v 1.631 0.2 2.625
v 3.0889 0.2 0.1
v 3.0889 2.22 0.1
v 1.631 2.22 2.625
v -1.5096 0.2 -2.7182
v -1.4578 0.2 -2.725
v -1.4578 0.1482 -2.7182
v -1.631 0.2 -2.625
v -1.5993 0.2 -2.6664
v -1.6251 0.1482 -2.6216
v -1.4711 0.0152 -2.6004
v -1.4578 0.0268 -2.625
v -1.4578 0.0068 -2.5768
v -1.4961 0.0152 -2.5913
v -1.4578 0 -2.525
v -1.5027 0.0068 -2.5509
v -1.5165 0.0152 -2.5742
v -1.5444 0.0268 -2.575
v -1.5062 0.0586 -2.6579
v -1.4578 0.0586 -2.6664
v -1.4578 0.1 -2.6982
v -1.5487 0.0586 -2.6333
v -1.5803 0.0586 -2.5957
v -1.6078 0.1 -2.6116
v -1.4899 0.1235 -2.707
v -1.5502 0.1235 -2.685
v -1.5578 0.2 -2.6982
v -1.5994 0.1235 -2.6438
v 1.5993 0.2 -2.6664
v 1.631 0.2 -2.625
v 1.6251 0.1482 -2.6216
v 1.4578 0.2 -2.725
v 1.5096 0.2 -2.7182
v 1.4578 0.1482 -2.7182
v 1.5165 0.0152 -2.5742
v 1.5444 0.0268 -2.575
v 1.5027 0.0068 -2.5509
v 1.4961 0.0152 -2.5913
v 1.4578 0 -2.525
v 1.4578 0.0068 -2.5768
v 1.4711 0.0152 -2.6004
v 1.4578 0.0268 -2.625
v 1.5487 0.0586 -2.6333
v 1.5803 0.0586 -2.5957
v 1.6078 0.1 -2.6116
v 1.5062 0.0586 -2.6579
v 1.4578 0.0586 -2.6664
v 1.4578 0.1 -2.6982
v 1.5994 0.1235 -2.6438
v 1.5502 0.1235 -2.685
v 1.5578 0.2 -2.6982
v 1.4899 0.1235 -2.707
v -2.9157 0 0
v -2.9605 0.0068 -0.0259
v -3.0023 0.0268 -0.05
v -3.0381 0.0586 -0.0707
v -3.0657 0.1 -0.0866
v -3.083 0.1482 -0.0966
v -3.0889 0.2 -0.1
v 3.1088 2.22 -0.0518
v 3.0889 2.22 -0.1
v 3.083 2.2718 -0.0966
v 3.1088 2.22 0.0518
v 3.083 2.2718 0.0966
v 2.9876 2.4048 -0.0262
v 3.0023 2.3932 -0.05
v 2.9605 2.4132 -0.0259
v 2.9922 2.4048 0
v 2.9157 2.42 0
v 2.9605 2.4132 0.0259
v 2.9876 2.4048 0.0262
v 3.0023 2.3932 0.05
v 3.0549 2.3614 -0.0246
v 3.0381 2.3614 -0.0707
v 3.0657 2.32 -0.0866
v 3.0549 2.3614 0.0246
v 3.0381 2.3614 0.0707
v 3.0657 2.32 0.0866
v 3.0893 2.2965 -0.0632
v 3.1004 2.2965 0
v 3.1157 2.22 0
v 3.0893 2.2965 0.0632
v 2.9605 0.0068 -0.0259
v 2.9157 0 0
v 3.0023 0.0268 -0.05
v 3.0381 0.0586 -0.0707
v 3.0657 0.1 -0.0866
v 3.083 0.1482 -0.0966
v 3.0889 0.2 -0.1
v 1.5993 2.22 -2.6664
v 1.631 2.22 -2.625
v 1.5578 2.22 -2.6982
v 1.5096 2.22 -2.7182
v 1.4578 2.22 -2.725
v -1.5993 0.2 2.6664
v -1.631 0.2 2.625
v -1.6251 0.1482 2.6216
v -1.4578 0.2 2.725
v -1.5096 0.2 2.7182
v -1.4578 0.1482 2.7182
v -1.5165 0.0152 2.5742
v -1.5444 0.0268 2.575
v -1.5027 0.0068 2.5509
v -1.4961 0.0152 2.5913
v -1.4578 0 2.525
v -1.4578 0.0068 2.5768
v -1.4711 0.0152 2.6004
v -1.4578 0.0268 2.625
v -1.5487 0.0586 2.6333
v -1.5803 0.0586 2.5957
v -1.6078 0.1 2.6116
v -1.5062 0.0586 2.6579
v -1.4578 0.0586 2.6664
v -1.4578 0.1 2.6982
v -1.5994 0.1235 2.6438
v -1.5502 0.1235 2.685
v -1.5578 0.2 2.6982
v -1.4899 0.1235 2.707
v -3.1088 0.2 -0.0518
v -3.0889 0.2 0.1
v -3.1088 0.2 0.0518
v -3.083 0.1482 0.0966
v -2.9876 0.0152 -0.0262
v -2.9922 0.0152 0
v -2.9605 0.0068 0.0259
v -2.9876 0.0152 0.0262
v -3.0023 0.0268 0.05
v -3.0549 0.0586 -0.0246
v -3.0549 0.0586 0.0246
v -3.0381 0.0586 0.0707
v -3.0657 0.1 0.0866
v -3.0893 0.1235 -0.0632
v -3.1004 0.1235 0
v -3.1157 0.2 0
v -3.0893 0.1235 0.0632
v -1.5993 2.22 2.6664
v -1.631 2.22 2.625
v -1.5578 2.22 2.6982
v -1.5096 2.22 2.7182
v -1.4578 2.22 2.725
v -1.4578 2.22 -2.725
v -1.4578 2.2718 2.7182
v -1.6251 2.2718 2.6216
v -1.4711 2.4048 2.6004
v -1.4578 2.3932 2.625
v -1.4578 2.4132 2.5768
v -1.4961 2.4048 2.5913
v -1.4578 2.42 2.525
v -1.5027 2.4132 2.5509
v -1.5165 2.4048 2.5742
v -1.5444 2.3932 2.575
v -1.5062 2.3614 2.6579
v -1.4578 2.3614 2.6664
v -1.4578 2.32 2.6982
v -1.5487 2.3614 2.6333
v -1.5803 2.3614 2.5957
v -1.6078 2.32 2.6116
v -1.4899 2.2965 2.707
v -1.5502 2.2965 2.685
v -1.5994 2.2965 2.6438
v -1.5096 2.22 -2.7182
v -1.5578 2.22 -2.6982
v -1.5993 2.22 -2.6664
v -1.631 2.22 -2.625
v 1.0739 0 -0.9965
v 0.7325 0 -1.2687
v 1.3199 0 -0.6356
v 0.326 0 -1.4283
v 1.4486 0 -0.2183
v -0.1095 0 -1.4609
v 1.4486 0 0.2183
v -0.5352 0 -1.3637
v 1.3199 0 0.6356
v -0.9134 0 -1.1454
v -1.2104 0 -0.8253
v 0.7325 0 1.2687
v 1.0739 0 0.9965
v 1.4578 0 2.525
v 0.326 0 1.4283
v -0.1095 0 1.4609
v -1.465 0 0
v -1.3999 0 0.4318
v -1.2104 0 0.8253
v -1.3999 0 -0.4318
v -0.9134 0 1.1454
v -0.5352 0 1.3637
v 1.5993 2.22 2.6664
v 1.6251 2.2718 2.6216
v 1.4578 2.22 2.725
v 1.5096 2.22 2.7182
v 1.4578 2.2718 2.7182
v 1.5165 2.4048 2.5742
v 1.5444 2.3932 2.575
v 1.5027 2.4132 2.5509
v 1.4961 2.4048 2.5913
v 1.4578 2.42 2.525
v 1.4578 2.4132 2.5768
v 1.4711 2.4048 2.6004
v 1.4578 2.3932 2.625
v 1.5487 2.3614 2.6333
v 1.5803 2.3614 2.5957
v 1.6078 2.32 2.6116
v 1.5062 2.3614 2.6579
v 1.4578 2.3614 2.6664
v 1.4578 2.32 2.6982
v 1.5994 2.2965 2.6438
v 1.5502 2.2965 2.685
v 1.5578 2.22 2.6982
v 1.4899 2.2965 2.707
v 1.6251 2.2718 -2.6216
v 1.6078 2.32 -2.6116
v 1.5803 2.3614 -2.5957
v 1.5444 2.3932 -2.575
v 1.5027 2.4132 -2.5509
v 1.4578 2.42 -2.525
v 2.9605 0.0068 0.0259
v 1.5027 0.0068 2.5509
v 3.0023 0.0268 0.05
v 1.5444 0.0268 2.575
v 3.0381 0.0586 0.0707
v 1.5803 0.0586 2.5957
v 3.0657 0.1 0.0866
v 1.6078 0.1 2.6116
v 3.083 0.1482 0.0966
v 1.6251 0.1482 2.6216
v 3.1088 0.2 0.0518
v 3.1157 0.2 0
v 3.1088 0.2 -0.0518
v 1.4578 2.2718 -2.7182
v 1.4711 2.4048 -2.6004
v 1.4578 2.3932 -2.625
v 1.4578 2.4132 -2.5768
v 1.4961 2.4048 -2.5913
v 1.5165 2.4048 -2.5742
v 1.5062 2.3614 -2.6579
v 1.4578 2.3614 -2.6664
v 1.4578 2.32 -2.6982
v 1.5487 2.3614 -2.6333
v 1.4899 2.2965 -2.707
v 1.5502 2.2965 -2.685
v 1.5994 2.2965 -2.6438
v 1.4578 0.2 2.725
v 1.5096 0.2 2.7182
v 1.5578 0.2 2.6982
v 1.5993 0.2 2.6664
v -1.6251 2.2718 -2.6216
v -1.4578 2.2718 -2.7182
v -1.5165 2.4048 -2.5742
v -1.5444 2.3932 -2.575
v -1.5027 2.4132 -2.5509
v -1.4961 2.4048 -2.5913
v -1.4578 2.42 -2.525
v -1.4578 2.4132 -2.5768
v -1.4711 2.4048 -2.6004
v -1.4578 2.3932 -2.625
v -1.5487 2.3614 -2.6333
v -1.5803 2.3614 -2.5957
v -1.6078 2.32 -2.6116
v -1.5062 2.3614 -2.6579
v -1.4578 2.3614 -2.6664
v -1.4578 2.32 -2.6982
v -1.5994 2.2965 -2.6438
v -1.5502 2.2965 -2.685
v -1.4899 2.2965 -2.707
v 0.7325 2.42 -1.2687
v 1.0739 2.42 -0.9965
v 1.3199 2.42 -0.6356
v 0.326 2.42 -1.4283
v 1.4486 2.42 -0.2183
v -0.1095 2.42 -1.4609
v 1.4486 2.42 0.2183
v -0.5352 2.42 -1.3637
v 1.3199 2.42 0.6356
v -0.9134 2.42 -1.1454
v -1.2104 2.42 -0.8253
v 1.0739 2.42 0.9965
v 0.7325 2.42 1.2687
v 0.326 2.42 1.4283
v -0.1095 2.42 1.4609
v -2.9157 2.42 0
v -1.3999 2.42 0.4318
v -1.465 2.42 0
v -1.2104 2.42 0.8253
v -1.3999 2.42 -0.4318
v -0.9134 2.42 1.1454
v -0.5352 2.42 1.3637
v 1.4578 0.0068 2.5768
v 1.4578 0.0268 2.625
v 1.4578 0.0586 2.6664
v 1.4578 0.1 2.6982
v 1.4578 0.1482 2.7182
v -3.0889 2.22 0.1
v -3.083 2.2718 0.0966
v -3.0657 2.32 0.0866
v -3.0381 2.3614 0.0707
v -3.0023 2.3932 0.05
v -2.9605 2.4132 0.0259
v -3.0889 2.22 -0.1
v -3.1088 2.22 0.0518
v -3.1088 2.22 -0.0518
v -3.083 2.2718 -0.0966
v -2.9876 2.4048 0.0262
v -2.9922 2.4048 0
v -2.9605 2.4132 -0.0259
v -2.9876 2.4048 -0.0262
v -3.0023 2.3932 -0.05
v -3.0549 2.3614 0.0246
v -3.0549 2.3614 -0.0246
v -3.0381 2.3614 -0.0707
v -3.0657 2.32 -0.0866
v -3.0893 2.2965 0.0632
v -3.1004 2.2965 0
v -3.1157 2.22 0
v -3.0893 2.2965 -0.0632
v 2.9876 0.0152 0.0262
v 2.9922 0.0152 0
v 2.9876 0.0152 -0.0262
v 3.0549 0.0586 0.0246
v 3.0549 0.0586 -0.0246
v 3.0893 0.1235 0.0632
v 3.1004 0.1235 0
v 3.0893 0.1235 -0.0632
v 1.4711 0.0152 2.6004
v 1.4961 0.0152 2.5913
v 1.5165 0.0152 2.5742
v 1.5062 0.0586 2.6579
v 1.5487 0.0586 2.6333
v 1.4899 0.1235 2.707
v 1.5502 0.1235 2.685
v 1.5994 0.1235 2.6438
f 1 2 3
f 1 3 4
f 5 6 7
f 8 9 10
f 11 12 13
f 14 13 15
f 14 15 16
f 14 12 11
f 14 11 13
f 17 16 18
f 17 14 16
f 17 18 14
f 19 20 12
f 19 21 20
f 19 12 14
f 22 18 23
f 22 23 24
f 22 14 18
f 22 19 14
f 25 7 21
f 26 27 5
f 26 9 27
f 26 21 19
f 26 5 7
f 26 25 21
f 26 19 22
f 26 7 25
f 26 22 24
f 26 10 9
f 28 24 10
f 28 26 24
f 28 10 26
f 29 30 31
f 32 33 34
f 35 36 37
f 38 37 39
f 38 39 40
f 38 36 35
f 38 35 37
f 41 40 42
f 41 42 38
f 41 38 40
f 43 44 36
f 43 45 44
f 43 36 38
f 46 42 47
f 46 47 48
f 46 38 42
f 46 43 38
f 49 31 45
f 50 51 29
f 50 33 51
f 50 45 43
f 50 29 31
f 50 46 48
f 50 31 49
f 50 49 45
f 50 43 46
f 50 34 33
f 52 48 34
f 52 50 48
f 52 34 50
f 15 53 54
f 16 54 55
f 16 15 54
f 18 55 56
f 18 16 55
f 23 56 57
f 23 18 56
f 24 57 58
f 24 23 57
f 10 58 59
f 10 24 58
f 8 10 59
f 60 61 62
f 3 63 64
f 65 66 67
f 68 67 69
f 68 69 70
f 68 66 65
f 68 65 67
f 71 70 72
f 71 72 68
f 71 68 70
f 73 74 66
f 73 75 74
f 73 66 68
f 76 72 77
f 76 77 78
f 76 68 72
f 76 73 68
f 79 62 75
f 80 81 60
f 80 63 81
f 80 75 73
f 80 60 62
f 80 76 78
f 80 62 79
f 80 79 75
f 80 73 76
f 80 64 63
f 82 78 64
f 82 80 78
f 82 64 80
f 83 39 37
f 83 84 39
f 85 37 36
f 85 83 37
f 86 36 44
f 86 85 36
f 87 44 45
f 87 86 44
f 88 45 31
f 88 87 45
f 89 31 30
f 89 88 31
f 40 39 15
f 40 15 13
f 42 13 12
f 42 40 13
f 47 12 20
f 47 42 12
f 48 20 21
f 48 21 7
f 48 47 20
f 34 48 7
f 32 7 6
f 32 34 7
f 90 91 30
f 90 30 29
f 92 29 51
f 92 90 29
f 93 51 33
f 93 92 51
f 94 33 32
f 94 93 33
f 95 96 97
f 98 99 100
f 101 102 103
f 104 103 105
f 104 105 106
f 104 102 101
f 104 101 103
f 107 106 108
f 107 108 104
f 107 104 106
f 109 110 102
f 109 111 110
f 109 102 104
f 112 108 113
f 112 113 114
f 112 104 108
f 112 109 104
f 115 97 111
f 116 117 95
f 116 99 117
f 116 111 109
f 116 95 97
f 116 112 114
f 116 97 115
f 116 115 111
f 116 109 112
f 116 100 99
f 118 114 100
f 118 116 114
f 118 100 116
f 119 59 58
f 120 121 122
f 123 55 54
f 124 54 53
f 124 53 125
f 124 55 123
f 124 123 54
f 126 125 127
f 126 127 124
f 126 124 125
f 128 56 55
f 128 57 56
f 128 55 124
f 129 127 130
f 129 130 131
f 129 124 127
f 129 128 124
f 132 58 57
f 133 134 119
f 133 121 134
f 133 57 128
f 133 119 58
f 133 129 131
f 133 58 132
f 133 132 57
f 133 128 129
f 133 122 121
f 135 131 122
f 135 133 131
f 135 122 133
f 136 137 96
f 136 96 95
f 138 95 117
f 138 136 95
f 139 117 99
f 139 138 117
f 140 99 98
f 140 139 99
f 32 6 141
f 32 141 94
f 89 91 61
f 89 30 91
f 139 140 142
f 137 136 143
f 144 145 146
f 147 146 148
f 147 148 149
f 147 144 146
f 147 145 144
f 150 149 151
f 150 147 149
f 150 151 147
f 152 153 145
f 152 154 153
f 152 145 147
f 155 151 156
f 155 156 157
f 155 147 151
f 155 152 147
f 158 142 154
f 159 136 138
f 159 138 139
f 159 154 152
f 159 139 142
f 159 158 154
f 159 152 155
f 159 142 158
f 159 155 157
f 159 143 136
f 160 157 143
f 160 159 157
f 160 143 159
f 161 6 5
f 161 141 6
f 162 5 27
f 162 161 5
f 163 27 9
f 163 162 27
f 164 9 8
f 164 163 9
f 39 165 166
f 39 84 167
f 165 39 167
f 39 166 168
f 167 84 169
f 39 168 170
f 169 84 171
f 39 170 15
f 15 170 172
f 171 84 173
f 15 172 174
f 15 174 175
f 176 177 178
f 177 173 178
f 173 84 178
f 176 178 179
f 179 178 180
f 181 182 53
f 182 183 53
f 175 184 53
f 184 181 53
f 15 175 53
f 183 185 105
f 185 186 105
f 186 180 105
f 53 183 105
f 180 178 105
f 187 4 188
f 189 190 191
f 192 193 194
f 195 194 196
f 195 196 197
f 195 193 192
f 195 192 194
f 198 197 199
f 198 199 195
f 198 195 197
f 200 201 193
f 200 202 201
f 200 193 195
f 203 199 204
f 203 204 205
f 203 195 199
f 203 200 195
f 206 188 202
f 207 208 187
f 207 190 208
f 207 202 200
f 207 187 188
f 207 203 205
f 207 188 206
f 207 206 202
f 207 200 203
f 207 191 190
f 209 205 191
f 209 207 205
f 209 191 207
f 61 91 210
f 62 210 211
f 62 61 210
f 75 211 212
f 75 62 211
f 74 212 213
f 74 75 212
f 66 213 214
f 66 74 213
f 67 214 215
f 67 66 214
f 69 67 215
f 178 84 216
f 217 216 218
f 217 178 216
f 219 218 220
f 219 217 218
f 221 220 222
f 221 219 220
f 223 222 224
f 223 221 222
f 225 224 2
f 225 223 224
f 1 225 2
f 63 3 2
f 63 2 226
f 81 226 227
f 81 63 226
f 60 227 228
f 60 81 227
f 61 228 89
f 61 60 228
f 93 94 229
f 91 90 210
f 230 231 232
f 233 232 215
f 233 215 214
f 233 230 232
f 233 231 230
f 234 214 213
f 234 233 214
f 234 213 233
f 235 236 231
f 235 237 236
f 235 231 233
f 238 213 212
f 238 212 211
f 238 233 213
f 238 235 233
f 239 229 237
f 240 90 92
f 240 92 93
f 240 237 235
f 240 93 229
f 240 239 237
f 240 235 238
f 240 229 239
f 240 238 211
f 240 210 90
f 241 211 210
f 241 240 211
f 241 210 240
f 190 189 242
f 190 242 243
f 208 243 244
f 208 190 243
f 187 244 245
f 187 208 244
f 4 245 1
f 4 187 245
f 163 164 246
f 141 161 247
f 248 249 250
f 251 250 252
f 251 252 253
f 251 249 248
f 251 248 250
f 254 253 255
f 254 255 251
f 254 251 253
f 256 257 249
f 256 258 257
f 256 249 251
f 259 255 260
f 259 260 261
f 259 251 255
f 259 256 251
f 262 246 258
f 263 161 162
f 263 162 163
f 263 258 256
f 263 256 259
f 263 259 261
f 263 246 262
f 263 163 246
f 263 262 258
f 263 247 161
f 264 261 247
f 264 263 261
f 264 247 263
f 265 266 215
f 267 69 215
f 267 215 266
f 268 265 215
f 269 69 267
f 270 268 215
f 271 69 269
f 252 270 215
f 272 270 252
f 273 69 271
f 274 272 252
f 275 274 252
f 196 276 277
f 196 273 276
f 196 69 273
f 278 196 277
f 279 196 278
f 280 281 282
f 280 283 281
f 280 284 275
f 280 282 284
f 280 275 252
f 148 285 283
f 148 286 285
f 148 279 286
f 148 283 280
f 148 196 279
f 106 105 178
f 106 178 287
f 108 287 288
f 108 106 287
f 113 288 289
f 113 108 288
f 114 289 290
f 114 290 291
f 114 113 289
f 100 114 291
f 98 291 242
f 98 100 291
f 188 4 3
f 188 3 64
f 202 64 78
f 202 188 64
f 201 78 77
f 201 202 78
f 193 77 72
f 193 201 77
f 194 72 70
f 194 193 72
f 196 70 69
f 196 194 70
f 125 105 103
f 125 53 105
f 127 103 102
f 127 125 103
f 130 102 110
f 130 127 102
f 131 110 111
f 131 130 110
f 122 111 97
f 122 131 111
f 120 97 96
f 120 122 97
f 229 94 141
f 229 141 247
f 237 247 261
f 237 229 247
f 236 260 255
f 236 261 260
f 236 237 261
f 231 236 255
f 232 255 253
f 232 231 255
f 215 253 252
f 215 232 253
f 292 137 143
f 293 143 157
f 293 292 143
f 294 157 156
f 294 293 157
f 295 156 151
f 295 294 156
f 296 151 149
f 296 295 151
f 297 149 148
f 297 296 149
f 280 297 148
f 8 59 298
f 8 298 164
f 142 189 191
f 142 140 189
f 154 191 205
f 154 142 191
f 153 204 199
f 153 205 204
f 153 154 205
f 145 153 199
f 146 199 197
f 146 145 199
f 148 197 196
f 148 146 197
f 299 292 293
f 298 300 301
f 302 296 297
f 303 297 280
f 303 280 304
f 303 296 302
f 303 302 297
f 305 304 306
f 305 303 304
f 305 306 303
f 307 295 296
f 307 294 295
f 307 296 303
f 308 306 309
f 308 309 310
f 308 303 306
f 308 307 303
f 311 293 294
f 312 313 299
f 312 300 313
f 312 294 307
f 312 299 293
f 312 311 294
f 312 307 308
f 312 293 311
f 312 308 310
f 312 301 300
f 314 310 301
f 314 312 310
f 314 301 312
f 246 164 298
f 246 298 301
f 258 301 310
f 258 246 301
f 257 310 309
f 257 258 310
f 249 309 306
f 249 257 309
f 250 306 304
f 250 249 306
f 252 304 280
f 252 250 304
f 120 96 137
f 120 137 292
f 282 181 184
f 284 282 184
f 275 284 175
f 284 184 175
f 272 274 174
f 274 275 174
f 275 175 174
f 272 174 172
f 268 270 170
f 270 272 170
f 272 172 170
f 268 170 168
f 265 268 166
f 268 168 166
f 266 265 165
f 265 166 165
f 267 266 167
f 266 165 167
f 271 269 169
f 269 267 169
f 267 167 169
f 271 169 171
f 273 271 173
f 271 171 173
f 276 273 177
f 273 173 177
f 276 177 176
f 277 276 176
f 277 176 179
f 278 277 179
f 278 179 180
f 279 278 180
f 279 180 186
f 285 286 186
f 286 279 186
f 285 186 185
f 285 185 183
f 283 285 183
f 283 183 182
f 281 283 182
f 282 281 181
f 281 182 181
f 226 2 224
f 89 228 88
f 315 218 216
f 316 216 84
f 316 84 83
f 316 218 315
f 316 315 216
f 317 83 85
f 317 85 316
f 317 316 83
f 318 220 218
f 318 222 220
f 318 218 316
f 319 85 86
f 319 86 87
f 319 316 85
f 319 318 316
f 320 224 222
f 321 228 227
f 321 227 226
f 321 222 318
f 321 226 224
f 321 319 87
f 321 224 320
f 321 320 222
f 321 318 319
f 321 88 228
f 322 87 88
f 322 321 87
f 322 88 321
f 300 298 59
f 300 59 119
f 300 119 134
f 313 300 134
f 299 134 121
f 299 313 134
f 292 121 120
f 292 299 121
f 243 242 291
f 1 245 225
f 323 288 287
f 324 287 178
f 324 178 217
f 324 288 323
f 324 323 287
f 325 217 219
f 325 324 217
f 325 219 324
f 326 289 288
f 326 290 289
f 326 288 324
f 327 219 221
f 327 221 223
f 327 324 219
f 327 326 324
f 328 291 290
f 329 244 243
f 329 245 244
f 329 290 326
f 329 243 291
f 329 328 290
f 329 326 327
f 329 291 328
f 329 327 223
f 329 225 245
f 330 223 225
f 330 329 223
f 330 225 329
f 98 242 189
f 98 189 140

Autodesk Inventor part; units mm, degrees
ref_plane "YZ Plane" through (0, 0, 0) normal (1, 0, 0) x (0, 1, 0)
ref_plane "XZ Plane" through (0, 0, 0) normal (0, 1, 0) x (-1, 0, 0)
ref_plane "XY Plane" through (0, 0, 0) normal (0, 0, 1) x (1, 0, 0)
sketch "Sketch1" plane through (0, 0, 0) normal (0, 1, 0) x (-1, 0, 0)
  line L0 (3.1466, 0) -> (1.5733, -2.725)
  line L1 (1.5733, -2.725) -> (-1.5733, -2.725)
  line L2 (-1.5733, -2.725) -> (-3.1466, 0)
  line L3 (-3.1466, 0) -> (-1.5733, 2.725)
  line L4 (-1.5733, 2.725) -> (1.5733, 2.725)
  line L5 (1.5733, 2.725) -> (3.1466, 0)
  circle A0 centre (0, 0) radius 1.465
  dimension "d0" = 5.45
  dimension "d1" = 2.93
extrude "Extrusion1" add sketch "Sketch1" along normal blind 2.42
fillet "Fillet1" radius 0.2 18 edges at (2.3599, 2.42, 1.3625) (0, 2.42, 2.725) (1.5733, 1.21, 2.725) (0, 0, 2.725) (-1.5733, 1.21, 2.725) (2.3599, 0, 1.3625) (3.1466, 1.21, 0) (1.5733, 1.21, -2.725) (2.3599, 2.42, -1.3625) (2.3599, 0, -1.3625) (-1.5733, 1.21, -2.725) (0, 2.42, -2.725) (0, 0, -2.725) (-2.3599, 2.42, 1.3625) (-2.3599, 2.42, -1.3625) (-3.1466, 1.21, 0) (-2.3599, 0, -1.3625) (-2.3599, 0, 1.3625)
thread "Thread1" size "M3x0.5" class "6H" standard "ANSI Metric M Profile" full length
properties part number "M3 Nut"
